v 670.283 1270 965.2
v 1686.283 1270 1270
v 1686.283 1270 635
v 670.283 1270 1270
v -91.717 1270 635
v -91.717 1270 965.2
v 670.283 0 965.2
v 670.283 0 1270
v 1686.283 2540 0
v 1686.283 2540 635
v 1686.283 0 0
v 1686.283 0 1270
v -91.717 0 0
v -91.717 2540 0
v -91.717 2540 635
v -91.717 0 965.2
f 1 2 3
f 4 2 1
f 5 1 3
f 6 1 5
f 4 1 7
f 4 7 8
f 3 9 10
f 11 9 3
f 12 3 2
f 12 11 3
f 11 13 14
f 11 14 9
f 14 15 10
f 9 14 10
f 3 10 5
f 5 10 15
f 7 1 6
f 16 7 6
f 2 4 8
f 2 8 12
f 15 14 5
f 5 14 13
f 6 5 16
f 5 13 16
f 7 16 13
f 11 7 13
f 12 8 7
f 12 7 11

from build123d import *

# Parameters (mm, degrees)
F0_W     = 1778
F0_H     = 1270
F1_DEPTH = 2540
F2_W     = 1778
F2_H     = 635
F3_DEPTH = 1270
F4_W     = 762
F4_H     = 304.8
F5_DEPTH = 12700


with BuildPart() as f1:
    # F0 (on Front) → F1 (new body)
    with BuildSketch(Plane.XZ):
        with Locations((797.283465, 635)):
            Rectangle(F0_W, F0_H)
    extrude(amount=-F1_DEPTH)

    # F2 (on face) → F3 (cut)
    with BuildSketch(Plane(origin=(0, 2540, 0), x_dir=(-1, 0, 0), z_dir=(0, 1, 0))):
        with Locations((-797.283465, 952.5)):
            Rectangle(F2_W, F2_H)
    extrude(amount=-F3_DEPTH, mode=Mode.SUBTRACT)

    # F4 (on face) → F5 (cut)
    with BuildSketch(Plane(origin=(0, 1270, 0), x_dir=(-1, 0, 0), z_dir=(0, 1, 0))):
        with Locations((-289.283465, 1117.6)):
            Rectangle(F4_W, F4_H)
    extrude(amount=-F5_DEPTH, mode=Mode.SUBTRACT)


solid = f1.part
